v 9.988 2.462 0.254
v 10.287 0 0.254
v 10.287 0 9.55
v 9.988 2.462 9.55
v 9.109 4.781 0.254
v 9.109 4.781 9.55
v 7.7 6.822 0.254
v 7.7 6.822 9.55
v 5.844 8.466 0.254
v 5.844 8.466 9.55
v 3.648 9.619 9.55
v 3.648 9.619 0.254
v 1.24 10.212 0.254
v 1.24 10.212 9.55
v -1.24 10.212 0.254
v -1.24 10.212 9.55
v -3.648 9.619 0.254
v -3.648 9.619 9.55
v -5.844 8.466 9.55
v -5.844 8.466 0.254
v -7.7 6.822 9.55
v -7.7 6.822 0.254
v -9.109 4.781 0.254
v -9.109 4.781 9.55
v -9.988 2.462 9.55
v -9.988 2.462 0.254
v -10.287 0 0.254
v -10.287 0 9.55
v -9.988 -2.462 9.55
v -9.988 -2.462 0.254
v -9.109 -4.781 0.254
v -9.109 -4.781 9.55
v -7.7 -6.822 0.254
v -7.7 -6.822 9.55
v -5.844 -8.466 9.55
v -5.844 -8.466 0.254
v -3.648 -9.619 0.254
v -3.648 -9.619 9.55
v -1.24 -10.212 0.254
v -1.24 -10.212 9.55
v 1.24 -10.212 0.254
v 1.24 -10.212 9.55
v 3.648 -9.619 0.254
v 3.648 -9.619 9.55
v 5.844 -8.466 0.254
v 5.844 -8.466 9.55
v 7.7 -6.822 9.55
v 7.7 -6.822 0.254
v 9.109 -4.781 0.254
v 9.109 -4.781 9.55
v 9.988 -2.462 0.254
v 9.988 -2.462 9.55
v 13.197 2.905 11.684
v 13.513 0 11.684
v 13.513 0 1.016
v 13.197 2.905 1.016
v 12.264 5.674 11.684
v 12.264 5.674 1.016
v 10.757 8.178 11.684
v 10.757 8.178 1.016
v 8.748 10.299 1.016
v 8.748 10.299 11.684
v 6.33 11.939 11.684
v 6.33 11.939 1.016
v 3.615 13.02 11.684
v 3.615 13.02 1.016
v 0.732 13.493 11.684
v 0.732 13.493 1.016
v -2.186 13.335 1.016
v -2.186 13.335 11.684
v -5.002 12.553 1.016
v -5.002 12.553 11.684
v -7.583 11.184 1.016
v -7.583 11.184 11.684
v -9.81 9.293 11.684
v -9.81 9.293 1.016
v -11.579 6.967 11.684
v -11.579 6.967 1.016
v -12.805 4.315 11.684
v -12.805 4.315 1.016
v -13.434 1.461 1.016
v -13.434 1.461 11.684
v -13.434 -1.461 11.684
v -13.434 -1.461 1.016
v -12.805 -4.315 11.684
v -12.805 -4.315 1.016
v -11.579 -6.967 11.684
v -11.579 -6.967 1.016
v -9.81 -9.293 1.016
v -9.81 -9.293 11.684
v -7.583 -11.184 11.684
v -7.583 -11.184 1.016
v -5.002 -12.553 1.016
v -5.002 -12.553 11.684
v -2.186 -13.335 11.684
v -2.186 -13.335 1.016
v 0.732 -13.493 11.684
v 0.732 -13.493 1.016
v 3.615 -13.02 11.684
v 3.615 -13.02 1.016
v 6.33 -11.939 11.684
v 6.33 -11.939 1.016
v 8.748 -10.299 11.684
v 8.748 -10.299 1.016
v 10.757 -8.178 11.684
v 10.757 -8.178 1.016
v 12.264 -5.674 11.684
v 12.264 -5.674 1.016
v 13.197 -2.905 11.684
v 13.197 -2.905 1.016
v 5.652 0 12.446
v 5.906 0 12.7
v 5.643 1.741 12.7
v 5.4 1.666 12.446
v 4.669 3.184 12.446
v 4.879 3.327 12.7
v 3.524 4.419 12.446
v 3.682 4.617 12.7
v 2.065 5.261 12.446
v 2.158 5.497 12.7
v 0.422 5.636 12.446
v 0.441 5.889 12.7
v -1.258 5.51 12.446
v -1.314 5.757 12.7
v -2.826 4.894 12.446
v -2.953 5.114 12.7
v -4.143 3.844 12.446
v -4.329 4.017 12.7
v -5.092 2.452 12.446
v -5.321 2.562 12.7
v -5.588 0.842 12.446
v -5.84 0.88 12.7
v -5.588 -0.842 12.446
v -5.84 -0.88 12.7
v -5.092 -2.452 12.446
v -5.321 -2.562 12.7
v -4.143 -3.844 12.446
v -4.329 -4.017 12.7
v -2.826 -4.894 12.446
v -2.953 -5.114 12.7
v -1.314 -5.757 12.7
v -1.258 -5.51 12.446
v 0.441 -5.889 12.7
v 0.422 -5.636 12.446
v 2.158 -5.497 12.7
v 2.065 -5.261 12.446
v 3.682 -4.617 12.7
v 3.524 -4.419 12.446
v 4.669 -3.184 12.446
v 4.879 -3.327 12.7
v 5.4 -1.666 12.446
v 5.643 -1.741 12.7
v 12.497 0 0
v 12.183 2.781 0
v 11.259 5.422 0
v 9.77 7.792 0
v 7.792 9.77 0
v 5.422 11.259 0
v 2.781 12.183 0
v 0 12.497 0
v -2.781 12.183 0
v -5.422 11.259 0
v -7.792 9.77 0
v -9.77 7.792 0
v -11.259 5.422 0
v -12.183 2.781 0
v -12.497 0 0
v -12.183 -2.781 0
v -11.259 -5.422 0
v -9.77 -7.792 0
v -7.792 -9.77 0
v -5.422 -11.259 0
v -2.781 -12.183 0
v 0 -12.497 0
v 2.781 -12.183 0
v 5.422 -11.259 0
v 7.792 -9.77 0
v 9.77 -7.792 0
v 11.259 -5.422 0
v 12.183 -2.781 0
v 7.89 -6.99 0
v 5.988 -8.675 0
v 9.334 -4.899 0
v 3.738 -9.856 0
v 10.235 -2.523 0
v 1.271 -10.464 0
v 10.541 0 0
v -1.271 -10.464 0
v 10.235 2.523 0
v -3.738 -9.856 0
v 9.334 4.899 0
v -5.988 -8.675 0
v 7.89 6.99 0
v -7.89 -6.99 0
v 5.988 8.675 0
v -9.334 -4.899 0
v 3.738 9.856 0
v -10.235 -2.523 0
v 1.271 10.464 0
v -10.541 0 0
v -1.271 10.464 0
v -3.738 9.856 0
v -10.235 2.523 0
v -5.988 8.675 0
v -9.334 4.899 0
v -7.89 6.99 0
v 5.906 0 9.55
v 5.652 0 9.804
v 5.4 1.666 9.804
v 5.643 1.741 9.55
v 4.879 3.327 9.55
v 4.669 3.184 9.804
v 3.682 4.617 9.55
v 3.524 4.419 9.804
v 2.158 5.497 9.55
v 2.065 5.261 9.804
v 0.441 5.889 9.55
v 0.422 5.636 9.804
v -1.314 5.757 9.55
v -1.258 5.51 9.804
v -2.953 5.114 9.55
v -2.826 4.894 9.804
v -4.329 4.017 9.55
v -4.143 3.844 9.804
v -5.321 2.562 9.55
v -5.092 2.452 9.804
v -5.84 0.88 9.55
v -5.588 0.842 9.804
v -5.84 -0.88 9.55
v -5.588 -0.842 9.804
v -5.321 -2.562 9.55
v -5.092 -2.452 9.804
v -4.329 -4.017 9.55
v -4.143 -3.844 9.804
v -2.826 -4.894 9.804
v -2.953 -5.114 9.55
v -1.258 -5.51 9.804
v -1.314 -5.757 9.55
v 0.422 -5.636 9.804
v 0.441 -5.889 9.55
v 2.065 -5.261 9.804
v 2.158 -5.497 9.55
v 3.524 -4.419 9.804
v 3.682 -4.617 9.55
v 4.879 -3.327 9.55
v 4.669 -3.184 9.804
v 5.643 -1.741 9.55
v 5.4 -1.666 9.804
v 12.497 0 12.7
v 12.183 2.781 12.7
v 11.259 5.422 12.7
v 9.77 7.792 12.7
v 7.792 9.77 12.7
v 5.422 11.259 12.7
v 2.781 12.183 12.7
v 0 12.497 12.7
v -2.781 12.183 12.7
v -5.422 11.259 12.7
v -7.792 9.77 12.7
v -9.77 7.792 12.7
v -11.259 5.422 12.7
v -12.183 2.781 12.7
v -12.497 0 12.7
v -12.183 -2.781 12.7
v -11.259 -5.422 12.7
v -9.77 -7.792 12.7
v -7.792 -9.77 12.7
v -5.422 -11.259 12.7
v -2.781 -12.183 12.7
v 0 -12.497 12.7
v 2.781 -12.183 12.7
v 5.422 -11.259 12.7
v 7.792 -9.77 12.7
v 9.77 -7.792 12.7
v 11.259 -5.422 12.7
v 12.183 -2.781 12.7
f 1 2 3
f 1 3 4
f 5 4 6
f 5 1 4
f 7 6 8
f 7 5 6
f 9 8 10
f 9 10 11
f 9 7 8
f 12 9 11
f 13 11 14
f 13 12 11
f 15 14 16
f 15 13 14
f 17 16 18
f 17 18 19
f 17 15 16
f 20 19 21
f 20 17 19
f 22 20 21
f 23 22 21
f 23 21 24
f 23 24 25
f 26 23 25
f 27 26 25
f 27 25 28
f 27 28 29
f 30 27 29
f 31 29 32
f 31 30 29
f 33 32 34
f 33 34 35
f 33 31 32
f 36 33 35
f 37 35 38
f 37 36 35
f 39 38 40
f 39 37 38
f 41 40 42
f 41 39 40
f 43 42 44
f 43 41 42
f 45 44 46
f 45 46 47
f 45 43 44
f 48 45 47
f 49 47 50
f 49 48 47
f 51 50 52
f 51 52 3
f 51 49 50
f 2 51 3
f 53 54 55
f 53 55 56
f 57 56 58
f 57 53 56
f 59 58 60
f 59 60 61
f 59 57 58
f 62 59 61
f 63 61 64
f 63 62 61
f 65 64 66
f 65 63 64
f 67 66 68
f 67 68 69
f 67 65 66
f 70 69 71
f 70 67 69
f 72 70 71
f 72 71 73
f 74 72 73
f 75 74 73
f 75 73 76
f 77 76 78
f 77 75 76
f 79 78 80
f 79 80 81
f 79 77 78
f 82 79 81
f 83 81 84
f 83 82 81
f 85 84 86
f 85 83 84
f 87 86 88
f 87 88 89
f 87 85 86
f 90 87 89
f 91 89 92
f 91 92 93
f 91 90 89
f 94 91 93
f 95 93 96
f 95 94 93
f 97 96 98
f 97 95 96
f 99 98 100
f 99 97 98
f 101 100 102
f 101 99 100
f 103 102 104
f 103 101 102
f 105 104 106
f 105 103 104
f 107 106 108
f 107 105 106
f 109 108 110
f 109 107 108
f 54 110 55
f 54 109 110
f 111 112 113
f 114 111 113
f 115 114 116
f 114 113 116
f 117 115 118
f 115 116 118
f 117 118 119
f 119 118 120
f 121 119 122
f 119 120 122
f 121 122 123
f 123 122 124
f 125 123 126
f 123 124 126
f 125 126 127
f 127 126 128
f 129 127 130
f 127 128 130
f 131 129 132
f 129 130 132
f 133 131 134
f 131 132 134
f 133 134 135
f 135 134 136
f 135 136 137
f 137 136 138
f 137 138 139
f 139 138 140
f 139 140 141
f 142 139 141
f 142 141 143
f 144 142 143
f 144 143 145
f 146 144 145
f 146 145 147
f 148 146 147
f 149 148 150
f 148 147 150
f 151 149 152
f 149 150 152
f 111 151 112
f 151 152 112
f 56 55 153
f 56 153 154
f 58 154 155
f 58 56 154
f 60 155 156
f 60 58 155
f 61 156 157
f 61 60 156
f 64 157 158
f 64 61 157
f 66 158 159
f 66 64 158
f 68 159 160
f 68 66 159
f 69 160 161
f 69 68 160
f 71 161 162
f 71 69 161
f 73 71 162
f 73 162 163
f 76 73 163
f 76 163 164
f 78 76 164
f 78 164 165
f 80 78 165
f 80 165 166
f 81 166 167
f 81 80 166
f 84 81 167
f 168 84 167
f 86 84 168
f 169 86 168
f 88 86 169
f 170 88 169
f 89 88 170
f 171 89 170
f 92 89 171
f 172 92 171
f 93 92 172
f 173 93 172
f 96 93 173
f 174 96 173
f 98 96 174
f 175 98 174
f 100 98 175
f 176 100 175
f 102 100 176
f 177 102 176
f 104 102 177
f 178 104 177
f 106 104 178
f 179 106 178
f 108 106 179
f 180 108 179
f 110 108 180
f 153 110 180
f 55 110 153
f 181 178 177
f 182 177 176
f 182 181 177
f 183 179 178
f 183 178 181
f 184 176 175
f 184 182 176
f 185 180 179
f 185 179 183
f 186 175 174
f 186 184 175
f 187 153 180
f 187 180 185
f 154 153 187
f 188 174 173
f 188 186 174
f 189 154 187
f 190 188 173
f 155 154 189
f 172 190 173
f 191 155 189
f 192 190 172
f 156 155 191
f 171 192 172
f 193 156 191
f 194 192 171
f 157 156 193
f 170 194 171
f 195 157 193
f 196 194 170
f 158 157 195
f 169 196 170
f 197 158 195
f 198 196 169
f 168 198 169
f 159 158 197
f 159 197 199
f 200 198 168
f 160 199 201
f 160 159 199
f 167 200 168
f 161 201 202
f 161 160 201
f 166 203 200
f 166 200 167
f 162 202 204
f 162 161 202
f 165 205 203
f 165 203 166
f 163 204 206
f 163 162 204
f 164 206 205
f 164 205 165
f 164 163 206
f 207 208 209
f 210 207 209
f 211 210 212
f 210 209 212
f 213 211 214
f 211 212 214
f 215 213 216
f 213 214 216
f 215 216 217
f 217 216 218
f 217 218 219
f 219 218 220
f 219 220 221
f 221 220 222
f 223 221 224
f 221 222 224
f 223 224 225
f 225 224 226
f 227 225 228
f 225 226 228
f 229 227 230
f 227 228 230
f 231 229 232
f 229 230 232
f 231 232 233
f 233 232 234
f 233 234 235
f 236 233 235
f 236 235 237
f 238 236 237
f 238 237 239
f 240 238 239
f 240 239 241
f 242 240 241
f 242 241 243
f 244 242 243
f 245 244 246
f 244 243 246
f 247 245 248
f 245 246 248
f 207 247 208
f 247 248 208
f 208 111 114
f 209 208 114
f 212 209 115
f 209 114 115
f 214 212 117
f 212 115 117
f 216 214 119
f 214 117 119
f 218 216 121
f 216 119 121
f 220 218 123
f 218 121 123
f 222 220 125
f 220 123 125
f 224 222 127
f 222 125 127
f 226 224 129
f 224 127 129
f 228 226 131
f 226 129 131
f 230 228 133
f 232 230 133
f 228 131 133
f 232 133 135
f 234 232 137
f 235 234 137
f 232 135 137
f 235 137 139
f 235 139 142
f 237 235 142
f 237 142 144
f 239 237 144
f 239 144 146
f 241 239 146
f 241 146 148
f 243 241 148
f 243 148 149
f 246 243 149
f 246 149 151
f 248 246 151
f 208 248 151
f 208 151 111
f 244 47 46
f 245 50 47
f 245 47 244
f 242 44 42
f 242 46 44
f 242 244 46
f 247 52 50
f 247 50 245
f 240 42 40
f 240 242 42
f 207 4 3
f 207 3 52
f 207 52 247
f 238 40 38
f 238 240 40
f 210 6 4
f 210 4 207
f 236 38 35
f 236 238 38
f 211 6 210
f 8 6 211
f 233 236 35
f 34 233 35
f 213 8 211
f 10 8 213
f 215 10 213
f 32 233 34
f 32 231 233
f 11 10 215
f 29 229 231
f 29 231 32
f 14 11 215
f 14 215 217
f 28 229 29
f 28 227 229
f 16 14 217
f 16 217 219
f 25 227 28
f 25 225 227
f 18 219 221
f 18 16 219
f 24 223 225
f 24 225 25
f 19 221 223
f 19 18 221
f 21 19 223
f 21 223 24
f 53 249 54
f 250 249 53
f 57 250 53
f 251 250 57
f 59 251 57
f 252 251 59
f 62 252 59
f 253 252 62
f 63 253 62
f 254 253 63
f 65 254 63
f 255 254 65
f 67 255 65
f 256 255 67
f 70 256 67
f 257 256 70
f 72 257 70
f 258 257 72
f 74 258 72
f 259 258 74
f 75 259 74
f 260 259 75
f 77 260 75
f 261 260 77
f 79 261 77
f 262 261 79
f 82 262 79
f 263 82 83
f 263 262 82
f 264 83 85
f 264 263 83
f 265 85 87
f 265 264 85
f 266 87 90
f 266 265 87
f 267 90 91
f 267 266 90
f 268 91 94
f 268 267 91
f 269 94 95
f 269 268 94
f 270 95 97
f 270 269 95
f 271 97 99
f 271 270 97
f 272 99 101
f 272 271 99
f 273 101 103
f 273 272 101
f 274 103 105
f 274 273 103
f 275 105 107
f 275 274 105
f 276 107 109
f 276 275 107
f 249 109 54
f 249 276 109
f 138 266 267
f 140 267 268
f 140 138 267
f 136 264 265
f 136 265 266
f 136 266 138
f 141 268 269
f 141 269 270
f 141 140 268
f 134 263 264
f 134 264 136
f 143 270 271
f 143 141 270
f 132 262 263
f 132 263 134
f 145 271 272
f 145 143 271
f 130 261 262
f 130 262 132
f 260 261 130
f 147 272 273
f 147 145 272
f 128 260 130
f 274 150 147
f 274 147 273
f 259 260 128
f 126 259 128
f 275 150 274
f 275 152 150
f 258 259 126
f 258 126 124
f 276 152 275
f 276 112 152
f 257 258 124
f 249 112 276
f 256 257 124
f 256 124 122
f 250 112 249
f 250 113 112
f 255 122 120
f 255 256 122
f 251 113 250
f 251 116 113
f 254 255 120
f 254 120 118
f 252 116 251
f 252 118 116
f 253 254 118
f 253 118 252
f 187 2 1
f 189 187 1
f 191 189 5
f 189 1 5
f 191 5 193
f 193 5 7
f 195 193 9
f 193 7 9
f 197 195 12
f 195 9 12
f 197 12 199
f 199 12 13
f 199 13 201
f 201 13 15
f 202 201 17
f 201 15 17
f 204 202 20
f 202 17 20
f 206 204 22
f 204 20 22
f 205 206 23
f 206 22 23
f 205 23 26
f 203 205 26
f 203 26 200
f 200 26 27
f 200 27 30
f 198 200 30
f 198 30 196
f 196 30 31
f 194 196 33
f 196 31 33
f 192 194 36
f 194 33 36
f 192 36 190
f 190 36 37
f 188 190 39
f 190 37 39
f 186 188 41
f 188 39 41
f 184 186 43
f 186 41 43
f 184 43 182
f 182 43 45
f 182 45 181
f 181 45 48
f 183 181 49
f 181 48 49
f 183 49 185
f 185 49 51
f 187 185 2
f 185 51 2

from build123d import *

# Parameters (mm, degrees)
F2_SIZE  = 1.016
F3_R     = 5.6515
F4_DEPTH = 25.4
F5_SIZE  = 0.254


with BuildPart() as f1:
    # F0 (on Front) → F1 (revolve)
    with BuildSketch(Plane.XZ):
        Polygon((10.287, 9.5504), (10.287, 0), (13.5128, 0), (13.5128, 12.7), (0, 12.7), (0, 9.5504), align=None)
    revolve(axis=Axis((0, 0, 6.35), (0, 0, 1)))

    # F2
    f2_edges = [f1.edges().sort_by_distance(p)[0] for p in [
        (-13.5128, 0, 12.7),
        (-13.5128, 0, 0),
    ]]
    chamfer(f2_edges, length=F2_SIZE)

    # F3 (on face) → F4 (cut)
    with BuildSketch(Plane.XY.offset(12.7)):
        Circle(F3_R)
    extrude(amount=-F4_DEPTH, mode=Mode.SUBTRACT)

    # F5
    f5_edges = [f1.edges().sort_by_distance(p)[0] for p in [
        (-5.6515, 0, 12.7),
        (-5.6515, 0, 9.5504),
        (-10.287, 0, 0),
    ]]
    chamfer(f5_edges, length=F5_SIZE)


solid = f1.part
